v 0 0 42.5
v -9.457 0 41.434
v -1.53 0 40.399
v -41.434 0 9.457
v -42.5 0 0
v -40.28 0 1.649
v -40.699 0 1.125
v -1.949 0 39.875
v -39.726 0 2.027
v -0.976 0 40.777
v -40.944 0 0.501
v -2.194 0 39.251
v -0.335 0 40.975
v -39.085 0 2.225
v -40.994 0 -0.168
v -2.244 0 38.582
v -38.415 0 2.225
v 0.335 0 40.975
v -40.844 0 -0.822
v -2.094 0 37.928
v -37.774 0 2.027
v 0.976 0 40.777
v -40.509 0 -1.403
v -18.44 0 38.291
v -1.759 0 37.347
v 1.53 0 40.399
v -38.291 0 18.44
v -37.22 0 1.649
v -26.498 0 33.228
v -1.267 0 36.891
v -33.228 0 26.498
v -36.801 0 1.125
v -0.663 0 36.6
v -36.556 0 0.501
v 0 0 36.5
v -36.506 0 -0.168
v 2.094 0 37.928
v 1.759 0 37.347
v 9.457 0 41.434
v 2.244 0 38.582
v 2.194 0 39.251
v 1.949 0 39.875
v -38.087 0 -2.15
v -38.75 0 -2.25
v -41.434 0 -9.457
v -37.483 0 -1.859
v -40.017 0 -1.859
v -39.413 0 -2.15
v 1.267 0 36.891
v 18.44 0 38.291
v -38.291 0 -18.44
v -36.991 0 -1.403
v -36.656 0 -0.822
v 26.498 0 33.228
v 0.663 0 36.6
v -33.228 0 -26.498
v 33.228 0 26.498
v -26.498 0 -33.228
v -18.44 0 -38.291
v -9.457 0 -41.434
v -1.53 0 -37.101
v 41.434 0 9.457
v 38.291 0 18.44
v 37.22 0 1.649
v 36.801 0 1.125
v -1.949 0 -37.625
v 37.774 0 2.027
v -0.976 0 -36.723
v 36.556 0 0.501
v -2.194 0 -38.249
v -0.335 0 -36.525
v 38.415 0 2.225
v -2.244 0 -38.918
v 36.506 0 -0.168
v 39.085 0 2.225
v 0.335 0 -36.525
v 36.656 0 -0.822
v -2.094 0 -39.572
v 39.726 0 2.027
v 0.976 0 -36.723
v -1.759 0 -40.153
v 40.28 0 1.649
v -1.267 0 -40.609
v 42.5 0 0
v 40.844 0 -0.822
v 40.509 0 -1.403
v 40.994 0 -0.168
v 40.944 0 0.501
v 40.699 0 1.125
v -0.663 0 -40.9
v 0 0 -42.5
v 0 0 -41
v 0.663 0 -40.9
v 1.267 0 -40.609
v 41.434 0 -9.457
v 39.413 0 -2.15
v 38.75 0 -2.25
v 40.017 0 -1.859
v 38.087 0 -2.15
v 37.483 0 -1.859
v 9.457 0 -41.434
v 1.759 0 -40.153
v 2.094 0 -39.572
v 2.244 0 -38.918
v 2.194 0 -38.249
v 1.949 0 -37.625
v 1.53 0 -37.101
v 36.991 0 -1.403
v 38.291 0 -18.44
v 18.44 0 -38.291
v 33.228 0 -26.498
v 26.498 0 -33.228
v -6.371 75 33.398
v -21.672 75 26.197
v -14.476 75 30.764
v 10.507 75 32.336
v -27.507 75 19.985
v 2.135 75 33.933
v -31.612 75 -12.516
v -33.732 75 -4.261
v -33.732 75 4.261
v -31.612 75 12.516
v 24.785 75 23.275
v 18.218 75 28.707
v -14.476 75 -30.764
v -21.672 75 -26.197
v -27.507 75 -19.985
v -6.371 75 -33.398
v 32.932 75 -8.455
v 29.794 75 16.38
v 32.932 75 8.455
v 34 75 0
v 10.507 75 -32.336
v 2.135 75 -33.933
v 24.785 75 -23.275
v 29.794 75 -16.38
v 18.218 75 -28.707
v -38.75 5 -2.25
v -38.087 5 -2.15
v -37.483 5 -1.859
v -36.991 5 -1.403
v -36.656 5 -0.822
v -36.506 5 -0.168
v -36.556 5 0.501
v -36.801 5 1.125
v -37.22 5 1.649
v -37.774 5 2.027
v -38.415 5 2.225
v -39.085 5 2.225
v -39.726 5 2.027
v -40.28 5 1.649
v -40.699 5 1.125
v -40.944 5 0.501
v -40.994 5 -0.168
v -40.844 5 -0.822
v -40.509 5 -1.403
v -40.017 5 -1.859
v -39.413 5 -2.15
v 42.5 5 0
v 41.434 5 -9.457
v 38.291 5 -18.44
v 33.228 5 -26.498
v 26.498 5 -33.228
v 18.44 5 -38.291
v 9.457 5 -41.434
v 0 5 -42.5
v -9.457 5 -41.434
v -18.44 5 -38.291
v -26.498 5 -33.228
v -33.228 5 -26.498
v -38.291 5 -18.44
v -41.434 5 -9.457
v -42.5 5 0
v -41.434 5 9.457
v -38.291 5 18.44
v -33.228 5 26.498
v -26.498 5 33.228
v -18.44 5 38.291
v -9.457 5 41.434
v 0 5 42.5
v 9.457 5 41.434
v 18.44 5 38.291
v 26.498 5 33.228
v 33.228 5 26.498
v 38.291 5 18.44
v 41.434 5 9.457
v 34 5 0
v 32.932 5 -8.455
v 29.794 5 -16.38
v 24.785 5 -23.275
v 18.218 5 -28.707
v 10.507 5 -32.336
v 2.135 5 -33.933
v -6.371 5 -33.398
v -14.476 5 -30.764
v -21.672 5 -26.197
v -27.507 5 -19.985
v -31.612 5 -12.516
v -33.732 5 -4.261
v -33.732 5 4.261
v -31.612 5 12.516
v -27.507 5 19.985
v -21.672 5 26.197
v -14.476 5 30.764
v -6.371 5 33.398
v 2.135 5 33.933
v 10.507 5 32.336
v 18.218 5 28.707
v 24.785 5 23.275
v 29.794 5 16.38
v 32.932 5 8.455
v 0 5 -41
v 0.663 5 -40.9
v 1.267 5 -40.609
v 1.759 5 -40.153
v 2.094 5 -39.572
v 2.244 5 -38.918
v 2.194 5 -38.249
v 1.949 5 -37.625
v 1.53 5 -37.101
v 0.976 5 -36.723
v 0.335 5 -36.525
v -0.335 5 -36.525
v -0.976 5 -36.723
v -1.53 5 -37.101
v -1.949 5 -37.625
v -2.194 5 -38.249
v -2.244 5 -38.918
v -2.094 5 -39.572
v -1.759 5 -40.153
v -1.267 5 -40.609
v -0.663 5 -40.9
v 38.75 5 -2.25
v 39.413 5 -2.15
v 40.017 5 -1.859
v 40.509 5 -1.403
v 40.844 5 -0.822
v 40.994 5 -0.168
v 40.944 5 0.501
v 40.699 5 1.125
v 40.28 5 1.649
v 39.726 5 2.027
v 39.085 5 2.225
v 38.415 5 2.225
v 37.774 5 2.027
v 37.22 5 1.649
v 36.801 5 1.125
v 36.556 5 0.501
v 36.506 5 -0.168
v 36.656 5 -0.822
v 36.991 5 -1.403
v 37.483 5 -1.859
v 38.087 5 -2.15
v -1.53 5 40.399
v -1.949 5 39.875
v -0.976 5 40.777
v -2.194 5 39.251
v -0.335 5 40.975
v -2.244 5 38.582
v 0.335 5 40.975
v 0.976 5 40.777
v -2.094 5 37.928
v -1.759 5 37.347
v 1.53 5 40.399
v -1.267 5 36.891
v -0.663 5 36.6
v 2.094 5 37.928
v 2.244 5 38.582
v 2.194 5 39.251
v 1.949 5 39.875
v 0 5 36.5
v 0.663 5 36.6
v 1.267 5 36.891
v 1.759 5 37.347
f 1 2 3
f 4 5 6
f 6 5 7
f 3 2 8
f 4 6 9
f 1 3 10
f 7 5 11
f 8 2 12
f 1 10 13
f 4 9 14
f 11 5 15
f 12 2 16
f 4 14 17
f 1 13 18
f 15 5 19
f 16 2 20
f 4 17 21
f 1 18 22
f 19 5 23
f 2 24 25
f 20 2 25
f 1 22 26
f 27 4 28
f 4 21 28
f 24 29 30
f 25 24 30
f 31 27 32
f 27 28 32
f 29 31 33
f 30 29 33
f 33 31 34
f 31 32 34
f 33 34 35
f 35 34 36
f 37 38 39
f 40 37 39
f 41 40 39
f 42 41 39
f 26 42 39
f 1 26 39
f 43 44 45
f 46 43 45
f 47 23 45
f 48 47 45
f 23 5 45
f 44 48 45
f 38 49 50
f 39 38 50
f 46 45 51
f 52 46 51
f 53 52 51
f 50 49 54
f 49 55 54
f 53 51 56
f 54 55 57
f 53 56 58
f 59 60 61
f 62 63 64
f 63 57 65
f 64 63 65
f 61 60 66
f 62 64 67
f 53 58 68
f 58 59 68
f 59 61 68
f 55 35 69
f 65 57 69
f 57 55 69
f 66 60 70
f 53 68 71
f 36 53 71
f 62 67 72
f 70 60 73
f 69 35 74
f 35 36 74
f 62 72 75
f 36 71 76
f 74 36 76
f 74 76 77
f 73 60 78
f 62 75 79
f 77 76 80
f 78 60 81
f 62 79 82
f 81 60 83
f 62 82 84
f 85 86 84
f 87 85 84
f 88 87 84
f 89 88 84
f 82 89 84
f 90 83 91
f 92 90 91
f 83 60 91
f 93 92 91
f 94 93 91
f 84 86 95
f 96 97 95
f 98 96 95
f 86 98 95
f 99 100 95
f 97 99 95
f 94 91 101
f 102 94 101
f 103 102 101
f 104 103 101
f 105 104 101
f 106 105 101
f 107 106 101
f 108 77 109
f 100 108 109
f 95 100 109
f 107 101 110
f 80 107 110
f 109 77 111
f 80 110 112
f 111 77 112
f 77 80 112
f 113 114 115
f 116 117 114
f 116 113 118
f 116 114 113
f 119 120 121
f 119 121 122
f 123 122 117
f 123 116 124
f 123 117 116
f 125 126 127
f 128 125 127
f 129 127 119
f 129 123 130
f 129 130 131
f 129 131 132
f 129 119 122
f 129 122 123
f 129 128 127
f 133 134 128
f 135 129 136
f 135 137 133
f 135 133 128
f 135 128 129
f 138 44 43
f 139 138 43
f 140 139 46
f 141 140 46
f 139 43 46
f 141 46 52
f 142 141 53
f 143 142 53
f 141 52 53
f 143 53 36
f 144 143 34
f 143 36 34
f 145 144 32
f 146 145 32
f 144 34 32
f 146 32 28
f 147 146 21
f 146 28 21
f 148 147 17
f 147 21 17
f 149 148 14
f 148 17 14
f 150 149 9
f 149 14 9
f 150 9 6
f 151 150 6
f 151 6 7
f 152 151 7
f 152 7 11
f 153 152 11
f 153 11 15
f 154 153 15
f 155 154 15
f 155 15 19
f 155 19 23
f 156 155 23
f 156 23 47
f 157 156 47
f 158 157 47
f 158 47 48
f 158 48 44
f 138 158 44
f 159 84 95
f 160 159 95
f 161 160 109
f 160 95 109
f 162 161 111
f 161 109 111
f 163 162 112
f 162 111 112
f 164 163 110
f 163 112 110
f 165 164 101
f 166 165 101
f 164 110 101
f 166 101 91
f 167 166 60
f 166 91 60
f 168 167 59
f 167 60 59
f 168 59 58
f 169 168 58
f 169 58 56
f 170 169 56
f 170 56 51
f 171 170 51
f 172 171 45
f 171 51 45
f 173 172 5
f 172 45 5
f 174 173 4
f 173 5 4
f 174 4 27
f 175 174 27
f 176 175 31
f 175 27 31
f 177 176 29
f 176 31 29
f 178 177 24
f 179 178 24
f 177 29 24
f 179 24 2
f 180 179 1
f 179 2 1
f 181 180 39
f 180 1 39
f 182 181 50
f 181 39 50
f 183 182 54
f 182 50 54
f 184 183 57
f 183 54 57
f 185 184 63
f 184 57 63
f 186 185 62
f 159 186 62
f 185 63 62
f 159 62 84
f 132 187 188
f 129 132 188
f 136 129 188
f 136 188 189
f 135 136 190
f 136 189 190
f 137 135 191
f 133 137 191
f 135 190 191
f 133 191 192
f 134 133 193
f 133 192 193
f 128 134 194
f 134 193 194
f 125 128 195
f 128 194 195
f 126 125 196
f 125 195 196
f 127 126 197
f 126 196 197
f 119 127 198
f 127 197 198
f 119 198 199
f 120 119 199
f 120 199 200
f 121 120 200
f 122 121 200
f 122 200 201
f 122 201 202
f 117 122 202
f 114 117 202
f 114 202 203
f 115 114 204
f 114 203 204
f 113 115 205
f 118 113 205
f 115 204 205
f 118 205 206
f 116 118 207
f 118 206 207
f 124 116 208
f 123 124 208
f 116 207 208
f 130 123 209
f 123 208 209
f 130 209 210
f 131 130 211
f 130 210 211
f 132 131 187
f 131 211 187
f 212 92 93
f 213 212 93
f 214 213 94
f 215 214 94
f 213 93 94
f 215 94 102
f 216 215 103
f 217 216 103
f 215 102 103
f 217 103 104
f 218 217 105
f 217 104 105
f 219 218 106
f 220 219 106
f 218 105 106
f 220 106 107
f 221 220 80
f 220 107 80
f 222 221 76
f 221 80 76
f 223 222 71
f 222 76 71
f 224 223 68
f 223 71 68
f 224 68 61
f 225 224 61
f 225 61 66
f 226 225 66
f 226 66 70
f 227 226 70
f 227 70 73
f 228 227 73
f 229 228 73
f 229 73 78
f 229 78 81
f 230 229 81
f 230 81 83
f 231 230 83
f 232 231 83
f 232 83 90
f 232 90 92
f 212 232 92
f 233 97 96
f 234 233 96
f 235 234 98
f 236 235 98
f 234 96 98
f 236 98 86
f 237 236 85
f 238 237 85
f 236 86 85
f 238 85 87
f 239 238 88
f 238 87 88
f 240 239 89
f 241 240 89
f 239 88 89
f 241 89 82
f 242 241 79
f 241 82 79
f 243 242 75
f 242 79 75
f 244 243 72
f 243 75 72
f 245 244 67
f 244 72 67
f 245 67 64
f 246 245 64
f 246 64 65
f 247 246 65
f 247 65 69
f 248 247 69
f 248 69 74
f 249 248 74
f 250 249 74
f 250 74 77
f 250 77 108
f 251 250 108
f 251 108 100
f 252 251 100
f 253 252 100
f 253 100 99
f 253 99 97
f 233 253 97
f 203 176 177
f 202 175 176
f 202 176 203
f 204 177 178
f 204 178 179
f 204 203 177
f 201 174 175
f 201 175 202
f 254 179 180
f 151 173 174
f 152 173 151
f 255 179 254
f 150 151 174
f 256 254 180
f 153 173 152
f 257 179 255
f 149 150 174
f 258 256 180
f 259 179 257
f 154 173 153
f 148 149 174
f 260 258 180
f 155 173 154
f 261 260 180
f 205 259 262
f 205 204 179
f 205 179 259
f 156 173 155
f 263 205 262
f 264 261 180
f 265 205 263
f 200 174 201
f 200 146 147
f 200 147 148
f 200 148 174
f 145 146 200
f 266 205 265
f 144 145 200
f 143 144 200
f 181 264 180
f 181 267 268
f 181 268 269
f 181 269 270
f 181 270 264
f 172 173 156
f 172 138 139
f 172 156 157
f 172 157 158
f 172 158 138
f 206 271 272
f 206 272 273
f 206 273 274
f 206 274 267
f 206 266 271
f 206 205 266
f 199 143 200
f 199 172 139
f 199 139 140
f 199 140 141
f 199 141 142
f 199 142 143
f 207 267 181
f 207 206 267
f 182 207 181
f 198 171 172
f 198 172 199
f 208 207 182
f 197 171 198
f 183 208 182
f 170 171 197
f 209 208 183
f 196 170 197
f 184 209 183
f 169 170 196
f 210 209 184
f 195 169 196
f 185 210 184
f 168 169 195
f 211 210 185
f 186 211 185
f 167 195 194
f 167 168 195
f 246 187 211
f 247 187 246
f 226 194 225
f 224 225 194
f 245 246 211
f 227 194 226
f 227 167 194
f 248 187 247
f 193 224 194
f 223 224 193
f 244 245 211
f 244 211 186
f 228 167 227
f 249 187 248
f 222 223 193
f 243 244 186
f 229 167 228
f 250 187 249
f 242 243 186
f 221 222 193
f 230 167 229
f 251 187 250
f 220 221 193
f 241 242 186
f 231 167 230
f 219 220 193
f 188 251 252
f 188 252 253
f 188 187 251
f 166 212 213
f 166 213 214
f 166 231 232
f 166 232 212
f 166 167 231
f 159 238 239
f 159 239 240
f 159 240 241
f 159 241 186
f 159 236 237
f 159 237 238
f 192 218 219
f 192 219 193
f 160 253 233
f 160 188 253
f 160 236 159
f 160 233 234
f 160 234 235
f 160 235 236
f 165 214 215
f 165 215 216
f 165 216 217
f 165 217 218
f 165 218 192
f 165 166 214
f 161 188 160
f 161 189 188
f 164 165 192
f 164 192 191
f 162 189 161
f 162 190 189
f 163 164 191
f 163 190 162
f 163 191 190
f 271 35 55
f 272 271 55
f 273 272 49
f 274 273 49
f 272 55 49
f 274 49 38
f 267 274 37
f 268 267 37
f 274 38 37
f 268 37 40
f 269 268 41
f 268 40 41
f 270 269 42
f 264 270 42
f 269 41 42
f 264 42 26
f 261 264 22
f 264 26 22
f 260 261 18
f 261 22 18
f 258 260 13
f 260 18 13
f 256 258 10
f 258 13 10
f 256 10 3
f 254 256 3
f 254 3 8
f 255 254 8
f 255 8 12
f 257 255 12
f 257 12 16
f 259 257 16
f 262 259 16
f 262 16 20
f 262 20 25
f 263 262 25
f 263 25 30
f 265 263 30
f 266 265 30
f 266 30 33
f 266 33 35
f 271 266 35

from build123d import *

# Parameters (mm, degrees)
ESQUISSE1_R        = 42.5
BOSS_EXTRU_2_DEPTH = 5
D_GAGEMENT_M42_D   = 4.5
ESQUISSE12_R       = 34
BOSS_EXTRU_3_DEPTH = 70


with BuildPart() as part:
    # Esquisse1 → Boss.-Extru.2 (new body)
    with BuildSketch(Plane(origin=(0, 0, 0), x_dir=(1, 0, 0), z_dir=(0, 1, 0))):
        Circle(ESQUISSE1_R)
    extrude(amount=BOSS_EXTRU_2_DEPTH)

    # Dégagement M42 (through all)
    with Locations(Plane(origin=(0, 5, -38.75), x_dir=(0, 0, 1), z_dir=(0, 1, 0))):
        with Locations((0, 0), (38.75, -38.75), (77.5, 0), (38.75, 38.75)):
            Hole(D_GAGEMENT_M42_D / 2)

    # Esquisse12 → Boss.-Extru.3 (add)
    with BuildSketch(Plane(origin=(0, 5, 0), x_dir=(1, 0, 0), z_dir=(0, 1, 0))):
        Circle(ESQUISSE12_R)
    extrude(amount=BOSS_EXTRU_3_DEPTH)


solid = part.part
